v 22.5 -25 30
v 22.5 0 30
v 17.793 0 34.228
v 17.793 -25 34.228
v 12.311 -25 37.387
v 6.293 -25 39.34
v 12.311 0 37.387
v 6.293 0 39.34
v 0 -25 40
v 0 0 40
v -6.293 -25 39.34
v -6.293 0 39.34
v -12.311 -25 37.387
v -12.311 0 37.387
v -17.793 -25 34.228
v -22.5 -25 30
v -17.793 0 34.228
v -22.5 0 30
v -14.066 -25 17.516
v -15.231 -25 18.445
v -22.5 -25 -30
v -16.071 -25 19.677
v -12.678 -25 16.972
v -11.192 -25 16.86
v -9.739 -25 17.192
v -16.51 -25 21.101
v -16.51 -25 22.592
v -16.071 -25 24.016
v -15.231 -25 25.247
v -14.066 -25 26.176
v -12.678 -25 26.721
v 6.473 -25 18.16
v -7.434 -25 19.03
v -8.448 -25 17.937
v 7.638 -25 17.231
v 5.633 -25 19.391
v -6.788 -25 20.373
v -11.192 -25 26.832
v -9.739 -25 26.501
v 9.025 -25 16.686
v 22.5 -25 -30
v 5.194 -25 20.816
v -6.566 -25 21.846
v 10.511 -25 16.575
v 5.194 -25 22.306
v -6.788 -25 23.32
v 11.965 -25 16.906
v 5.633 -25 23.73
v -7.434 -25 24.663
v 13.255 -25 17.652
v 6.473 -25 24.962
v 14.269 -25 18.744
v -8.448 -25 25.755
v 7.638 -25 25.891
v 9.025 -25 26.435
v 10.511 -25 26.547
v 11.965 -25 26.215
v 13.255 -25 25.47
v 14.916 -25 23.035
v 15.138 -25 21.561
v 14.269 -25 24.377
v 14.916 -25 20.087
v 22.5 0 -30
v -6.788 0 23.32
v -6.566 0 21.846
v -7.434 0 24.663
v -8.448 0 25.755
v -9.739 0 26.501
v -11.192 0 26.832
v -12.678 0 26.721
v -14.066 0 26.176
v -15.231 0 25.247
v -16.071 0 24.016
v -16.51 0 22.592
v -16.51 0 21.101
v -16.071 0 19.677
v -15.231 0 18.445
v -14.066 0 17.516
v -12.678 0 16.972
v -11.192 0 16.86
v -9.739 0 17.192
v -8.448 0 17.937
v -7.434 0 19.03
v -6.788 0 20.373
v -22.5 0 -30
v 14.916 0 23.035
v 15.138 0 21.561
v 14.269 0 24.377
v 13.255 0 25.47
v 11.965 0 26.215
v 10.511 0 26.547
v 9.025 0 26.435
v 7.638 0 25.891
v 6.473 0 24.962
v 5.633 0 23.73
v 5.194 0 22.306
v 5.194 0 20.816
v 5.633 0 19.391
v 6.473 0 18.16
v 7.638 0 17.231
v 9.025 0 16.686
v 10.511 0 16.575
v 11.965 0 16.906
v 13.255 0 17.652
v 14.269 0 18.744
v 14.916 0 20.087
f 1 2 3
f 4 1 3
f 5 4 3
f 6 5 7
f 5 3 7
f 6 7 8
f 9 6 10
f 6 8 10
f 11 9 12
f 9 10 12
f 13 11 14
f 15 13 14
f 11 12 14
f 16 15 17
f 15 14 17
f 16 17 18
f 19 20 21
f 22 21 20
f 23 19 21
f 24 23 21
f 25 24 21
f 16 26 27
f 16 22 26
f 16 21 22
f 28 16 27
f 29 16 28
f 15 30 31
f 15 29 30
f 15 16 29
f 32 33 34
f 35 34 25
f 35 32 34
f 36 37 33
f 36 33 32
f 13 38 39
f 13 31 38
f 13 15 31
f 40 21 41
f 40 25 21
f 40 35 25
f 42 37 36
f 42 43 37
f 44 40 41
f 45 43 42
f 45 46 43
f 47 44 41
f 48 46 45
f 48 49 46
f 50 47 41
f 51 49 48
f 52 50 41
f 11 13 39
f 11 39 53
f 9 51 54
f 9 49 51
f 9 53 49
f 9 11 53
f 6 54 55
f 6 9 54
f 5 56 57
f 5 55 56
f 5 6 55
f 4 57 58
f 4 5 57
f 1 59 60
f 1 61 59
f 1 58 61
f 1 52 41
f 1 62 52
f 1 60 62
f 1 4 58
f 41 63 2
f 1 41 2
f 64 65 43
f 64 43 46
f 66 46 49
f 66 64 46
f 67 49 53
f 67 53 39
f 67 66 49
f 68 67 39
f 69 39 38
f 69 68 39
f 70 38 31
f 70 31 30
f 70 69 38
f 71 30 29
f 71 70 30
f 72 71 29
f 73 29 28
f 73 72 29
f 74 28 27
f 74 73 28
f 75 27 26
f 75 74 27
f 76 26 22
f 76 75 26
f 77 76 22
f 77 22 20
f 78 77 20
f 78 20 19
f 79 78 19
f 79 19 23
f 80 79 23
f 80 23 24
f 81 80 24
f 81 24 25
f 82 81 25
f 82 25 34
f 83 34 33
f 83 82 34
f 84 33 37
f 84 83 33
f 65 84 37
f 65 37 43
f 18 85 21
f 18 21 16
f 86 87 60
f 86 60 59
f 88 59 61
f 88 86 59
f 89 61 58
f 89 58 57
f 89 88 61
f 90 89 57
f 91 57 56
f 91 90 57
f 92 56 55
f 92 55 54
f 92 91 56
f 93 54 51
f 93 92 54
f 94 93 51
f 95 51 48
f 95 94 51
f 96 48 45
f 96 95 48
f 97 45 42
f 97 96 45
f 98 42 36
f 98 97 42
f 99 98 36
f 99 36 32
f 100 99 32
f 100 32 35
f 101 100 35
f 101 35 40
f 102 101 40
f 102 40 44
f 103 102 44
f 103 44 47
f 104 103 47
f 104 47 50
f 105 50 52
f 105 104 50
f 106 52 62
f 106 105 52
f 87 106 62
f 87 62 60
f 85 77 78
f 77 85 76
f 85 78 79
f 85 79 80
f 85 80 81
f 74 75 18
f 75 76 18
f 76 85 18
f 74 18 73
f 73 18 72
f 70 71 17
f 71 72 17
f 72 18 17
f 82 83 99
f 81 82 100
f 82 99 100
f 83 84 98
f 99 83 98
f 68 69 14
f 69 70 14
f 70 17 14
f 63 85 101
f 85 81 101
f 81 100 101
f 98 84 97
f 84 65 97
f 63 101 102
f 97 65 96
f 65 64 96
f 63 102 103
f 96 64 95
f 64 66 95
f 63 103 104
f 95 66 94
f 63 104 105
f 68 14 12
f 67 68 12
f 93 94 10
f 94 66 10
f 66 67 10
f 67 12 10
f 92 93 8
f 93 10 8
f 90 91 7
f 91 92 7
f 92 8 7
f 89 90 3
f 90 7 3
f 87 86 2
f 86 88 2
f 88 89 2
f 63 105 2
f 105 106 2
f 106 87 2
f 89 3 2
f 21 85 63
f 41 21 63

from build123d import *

# Parameters (mm, degrees)
F0_W     = 45
F0_H     = 60
F0_R     = 5
F1_DEPTH = 25


with BuildPart() as f1:
    # F0 (on Front) → F1 (new body)
    with BuildSketch(Plane.XZ):
        with BuildLine():
            ThreePointArc((22.5, 30), (0, 40), (-22.5, 30))
            Line((-22.5, 30), (22.5, 30))
        make_face()
        Rectangle(F0_W, F0_H)
        with Locations((-11.565693, 21.846309)):
            Circle(F0_R, mode=Mode.SUBTRACT)
        with Locations((10.13783, 21.560736)):
            Circle(F0_R, mode=Mode.SUBTRACT)
    extrude(amount=F1_DEPTH)


solid = f1.part
